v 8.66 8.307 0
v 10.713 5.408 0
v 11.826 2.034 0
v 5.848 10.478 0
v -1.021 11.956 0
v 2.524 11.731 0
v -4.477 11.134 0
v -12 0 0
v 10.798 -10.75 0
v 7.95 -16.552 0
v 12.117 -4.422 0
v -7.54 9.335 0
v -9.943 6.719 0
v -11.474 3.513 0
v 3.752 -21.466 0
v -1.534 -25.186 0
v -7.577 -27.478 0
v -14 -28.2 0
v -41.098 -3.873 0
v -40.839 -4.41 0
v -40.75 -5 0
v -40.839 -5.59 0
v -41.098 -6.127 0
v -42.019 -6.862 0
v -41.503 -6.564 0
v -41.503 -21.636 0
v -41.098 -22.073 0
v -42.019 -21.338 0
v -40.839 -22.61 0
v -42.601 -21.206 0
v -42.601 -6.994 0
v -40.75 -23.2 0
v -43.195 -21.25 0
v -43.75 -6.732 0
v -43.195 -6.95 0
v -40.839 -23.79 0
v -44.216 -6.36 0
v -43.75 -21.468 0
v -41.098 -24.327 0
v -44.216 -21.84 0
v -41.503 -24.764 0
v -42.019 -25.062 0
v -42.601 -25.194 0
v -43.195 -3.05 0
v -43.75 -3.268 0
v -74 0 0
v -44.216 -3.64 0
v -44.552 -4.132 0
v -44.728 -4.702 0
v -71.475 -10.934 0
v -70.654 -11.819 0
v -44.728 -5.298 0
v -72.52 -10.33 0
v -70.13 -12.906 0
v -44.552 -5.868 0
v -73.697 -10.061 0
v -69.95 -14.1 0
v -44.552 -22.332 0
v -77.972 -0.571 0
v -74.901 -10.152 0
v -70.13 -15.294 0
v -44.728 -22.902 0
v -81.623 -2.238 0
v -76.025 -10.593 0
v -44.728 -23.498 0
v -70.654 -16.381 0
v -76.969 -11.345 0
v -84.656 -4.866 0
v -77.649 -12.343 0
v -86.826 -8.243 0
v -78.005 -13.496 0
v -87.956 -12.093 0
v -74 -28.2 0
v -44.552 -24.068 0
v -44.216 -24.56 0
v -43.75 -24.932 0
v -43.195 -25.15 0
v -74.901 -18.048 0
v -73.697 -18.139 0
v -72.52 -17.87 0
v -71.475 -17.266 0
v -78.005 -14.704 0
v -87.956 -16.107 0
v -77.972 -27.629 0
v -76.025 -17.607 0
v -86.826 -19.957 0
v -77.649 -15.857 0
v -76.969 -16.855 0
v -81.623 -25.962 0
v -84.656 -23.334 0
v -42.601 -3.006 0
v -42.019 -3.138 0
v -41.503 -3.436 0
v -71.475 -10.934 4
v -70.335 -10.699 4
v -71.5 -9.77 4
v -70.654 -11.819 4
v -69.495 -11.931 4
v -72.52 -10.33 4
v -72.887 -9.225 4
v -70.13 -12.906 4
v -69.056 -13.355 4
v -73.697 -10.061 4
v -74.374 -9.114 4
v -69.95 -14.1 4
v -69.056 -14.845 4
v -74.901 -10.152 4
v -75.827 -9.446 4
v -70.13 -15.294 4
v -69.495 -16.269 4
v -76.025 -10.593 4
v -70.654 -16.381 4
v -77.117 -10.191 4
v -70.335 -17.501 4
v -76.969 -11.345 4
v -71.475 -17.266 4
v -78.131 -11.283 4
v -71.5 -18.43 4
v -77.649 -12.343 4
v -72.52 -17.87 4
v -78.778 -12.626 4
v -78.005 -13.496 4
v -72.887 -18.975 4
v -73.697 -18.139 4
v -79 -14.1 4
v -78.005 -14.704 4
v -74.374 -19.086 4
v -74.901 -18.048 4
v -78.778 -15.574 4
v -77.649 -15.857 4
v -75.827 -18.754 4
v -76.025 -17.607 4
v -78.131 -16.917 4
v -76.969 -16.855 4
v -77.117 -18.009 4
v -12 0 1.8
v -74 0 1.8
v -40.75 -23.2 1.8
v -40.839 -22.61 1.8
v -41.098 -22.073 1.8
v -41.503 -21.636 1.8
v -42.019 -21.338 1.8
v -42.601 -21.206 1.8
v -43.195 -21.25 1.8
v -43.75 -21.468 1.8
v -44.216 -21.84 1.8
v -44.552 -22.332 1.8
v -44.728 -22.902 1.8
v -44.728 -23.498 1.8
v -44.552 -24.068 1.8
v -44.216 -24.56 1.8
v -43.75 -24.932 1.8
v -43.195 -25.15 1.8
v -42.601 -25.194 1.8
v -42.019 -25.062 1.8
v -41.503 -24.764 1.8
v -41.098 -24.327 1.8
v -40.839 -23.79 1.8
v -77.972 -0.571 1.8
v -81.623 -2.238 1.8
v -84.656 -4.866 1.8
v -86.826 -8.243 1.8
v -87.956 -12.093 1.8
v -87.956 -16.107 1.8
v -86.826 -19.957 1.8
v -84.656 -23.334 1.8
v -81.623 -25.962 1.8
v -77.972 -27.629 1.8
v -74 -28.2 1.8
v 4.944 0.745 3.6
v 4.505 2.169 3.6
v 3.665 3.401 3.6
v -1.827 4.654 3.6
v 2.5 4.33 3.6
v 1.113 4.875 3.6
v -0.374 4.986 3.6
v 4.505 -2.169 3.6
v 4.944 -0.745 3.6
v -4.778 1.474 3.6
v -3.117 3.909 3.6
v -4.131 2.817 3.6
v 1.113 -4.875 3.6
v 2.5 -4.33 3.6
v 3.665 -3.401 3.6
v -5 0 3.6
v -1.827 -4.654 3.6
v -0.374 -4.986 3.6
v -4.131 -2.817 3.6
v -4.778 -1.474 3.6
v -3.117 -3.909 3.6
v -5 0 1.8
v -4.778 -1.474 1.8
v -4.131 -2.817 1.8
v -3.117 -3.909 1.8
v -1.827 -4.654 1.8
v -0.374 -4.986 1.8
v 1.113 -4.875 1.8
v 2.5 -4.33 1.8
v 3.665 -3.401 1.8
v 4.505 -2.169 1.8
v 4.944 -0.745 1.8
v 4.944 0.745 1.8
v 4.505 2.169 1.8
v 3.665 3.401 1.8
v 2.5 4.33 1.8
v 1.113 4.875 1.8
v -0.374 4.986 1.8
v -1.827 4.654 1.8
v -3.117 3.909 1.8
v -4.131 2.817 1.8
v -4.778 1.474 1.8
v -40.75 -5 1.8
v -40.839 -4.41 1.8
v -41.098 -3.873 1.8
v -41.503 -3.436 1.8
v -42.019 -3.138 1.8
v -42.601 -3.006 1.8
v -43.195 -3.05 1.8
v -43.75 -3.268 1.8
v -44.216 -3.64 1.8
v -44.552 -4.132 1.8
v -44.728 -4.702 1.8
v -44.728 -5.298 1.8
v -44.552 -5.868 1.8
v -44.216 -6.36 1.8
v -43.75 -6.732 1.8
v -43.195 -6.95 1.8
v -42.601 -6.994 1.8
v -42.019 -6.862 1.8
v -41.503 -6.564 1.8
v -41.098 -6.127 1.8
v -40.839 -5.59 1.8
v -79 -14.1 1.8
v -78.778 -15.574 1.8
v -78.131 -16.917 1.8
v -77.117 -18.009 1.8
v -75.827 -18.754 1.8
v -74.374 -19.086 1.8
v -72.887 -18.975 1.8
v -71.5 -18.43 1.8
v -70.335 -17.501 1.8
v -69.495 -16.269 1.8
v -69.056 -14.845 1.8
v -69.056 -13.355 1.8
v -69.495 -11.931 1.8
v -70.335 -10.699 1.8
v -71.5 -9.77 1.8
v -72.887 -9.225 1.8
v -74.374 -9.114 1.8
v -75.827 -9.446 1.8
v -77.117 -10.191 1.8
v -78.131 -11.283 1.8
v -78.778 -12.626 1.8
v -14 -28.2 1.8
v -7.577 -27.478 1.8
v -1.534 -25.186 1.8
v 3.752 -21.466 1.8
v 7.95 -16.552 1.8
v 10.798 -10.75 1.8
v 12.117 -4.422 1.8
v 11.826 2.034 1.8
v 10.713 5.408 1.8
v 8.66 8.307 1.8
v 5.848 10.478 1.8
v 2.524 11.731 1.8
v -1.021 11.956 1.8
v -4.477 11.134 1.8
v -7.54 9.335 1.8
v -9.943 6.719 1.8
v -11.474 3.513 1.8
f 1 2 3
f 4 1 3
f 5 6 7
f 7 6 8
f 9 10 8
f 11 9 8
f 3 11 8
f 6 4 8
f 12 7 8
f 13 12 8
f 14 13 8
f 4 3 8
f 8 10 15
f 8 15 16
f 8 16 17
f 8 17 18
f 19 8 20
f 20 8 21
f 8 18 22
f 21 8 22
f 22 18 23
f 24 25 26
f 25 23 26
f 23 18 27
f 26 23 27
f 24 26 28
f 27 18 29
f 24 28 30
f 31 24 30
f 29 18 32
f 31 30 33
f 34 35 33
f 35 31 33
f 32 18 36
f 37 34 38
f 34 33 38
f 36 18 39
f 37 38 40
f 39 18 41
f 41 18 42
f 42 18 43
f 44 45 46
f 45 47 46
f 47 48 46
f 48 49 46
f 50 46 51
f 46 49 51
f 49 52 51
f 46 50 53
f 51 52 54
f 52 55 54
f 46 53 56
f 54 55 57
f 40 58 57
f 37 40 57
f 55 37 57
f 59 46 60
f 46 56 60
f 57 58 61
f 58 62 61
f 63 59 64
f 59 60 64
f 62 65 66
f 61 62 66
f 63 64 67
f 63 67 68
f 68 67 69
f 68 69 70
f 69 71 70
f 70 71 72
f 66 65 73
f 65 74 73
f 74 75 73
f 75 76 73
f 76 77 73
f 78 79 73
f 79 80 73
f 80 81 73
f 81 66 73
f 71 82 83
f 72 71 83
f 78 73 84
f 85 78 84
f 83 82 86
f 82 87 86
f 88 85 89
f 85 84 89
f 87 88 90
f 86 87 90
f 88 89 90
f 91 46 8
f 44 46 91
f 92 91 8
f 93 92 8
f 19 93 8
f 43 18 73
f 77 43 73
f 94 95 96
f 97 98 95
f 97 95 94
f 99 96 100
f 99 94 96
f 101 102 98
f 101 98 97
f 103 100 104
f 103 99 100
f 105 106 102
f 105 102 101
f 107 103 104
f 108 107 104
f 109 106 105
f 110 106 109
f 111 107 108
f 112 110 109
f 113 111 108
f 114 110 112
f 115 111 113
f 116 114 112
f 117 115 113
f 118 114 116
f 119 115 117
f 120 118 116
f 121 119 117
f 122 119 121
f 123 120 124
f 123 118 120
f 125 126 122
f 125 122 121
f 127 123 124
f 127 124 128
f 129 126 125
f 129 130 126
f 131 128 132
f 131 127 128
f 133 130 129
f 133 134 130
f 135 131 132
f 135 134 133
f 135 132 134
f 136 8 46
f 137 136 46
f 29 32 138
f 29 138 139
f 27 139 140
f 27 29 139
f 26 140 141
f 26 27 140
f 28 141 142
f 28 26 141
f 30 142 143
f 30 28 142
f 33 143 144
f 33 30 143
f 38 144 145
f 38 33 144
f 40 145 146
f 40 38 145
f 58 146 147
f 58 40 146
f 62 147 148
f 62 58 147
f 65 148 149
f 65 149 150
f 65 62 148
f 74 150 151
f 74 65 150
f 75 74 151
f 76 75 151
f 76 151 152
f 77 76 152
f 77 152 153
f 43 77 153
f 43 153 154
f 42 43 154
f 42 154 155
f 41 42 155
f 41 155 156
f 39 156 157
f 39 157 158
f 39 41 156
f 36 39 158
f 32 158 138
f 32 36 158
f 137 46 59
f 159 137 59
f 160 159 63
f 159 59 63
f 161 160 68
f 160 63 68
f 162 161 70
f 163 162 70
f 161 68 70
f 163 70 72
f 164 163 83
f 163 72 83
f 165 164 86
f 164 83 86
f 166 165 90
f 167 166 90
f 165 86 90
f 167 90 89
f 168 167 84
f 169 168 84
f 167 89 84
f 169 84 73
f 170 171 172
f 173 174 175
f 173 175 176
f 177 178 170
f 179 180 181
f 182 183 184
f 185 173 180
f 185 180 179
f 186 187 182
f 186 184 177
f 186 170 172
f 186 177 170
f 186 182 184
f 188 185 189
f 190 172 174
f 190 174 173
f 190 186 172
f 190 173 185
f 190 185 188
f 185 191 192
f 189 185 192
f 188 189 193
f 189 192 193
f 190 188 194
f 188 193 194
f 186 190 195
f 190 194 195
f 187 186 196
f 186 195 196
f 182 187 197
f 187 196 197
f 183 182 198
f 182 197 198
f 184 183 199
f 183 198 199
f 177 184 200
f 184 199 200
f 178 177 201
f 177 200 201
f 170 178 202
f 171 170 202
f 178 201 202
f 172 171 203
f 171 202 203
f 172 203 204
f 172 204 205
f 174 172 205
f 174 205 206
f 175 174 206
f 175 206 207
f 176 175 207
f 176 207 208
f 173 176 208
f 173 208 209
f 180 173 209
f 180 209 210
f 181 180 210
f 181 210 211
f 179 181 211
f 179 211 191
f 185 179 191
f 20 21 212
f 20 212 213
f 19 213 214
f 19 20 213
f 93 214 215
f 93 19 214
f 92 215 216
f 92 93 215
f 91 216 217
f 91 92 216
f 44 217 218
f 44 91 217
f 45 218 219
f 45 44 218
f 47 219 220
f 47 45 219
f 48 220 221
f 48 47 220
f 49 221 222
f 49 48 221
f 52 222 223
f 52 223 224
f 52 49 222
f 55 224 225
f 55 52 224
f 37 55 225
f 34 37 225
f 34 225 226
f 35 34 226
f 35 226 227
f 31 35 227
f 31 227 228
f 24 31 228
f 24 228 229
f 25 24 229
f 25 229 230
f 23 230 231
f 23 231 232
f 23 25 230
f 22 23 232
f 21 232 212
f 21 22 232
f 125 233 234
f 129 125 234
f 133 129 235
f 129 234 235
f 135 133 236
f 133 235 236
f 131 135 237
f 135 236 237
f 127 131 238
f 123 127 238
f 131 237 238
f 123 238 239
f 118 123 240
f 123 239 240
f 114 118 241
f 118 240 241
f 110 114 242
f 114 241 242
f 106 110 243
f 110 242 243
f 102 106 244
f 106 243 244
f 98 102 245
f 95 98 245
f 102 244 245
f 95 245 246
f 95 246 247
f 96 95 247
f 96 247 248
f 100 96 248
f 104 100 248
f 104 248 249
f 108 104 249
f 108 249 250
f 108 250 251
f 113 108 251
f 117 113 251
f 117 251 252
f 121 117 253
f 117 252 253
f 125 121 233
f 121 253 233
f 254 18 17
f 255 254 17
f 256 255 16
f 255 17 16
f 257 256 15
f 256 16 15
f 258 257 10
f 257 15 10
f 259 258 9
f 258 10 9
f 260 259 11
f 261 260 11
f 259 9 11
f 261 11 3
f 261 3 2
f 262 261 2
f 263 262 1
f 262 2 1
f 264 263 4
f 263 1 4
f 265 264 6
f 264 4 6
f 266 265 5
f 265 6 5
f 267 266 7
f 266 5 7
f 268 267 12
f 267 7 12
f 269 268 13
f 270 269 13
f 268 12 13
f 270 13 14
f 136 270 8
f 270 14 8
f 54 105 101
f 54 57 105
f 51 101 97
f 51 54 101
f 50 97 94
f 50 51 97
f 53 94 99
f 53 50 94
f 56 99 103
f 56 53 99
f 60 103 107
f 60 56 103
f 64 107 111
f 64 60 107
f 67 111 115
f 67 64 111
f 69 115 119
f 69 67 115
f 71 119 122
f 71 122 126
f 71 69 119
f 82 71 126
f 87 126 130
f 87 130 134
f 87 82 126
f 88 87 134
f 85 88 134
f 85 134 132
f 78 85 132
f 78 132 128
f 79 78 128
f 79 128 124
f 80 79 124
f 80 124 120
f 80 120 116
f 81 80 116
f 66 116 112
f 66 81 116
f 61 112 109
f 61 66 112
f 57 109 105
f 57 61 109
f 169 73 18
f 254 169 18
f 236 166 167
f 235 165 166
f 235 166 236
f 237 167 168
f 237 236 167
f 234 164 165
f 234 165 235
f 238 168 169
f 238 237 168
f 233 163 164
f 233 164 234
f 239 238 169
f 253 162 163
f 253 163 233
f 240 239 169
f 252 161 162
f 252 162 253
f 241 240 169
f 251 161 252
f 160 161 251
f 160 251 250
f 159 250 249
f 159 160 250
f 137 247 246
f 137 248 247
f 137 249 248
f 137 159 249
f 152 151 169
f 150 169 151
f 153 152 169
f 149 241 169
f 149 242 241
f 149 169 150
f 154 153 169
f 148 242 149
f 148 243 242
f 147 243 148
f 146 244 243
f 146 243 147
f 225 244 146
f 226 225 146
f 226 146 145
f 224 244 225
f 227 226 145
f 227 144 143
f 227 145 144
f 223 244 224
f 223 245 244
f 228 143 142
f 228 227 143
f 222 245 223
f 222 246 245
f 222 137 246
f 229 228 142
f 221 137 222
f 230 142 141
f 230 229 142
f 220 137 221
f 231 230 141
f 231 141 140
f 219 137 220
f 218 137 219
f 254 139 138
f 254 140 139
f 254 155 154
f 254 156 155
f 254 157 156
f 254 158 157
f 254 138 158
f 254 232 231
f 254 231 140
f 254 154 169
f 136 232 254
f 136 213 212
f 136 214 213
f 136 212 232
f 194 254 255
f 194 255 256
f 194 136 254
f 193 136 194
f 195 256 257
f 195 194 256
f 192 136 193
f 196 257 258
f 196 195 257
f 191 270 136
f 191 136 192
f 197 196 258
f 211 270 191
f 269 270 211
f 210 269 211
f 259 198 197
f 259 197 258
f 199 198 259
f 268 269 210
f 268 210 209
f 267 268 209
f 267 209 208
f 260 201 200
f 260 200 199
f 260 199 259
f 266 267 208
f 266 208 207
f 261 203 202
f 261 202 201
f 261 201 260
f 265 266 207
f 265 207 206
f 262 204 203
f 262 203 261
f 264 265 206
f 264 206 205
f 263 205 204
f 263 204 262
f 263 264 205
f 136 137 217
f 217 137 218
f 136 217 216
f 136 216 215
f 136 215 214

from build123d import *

# Parameters (mm, degrees)
ESBO_O1_R                = 4.05
ESBO_O1_R_2              = 2
RESSALTO_EXTRUS_O1_DEPTH = 1.8
ESBO_O2_R                = 5
RESSALTO_EXTRUS_O2_DEPTH = 3.6
ESBO_O4_R                = 5
ESBO_O4_R_2              = 4.05
RESSALTO_EXTRUS_O3_DEPTH = 2.2


with BuildPart() as part:
    # Esboço1 → Ressalto-extrusão1 (new body)
    with BuildSketch(Plane.XY):
        with BuildLine():
            Line((-12, 0), (-74, 0))
            ThreePointArc((-74, 0), (-88.1, -14.1), (-74, -28.2))
            Line((-74, -28.2), (-14, -28.2))
            ThreePointArc((-14, -28.2), (6.004940765, -19.140656488), (11.826301138, 2.034355278))
            ThreePointArc((11.826301138, 2.034355278), (-1.020878628, 11.956496428), (-12, 0))
        make_face()
        with Locations((-74, -14.1)):
            Circle(ESBO_O1_R, mode=Mode.SUBTRACT)
        with Locations((-42.75, -5)):
            Circle(ESBO_O1_R_2, mode=Mode.SUBTRACT)
        with Locations((-42.75, -23.2)):
            Circle(ESBO_O1_R_2, mode=Mode.SUBTRACT)
    extrude(amount=RESSALTO_EXTRUS_O1_DEPTH)

    # Esboço2 → Ressalto-extrusão2 (add)
    with BuildSketch(Plane.XY):
        with Locations(Location((0, 0, 0), (0, 0, 180))):
            Circle(ESBO_O2_R)
    extrude(amount=RESSALTO_EXTRUS_O2_DEPTH)

    # Esboço4 → Ressalto-extrusão3 (add)
    with BuildSketch(Plane.XY.offset(1.8)):
        with Locations(Location((-74, -14.1, 0), (0, 0, 180))):
            Circle(ESBO_O4_R)
        with Locations((-74, -14.1)):
            Circle(ESBO_O4_R_2, mode=Mode.SUBTRACT)
    extrude(amount=RESSALTO_EXTRUS_O3_DEPTH)


solid = part.part
